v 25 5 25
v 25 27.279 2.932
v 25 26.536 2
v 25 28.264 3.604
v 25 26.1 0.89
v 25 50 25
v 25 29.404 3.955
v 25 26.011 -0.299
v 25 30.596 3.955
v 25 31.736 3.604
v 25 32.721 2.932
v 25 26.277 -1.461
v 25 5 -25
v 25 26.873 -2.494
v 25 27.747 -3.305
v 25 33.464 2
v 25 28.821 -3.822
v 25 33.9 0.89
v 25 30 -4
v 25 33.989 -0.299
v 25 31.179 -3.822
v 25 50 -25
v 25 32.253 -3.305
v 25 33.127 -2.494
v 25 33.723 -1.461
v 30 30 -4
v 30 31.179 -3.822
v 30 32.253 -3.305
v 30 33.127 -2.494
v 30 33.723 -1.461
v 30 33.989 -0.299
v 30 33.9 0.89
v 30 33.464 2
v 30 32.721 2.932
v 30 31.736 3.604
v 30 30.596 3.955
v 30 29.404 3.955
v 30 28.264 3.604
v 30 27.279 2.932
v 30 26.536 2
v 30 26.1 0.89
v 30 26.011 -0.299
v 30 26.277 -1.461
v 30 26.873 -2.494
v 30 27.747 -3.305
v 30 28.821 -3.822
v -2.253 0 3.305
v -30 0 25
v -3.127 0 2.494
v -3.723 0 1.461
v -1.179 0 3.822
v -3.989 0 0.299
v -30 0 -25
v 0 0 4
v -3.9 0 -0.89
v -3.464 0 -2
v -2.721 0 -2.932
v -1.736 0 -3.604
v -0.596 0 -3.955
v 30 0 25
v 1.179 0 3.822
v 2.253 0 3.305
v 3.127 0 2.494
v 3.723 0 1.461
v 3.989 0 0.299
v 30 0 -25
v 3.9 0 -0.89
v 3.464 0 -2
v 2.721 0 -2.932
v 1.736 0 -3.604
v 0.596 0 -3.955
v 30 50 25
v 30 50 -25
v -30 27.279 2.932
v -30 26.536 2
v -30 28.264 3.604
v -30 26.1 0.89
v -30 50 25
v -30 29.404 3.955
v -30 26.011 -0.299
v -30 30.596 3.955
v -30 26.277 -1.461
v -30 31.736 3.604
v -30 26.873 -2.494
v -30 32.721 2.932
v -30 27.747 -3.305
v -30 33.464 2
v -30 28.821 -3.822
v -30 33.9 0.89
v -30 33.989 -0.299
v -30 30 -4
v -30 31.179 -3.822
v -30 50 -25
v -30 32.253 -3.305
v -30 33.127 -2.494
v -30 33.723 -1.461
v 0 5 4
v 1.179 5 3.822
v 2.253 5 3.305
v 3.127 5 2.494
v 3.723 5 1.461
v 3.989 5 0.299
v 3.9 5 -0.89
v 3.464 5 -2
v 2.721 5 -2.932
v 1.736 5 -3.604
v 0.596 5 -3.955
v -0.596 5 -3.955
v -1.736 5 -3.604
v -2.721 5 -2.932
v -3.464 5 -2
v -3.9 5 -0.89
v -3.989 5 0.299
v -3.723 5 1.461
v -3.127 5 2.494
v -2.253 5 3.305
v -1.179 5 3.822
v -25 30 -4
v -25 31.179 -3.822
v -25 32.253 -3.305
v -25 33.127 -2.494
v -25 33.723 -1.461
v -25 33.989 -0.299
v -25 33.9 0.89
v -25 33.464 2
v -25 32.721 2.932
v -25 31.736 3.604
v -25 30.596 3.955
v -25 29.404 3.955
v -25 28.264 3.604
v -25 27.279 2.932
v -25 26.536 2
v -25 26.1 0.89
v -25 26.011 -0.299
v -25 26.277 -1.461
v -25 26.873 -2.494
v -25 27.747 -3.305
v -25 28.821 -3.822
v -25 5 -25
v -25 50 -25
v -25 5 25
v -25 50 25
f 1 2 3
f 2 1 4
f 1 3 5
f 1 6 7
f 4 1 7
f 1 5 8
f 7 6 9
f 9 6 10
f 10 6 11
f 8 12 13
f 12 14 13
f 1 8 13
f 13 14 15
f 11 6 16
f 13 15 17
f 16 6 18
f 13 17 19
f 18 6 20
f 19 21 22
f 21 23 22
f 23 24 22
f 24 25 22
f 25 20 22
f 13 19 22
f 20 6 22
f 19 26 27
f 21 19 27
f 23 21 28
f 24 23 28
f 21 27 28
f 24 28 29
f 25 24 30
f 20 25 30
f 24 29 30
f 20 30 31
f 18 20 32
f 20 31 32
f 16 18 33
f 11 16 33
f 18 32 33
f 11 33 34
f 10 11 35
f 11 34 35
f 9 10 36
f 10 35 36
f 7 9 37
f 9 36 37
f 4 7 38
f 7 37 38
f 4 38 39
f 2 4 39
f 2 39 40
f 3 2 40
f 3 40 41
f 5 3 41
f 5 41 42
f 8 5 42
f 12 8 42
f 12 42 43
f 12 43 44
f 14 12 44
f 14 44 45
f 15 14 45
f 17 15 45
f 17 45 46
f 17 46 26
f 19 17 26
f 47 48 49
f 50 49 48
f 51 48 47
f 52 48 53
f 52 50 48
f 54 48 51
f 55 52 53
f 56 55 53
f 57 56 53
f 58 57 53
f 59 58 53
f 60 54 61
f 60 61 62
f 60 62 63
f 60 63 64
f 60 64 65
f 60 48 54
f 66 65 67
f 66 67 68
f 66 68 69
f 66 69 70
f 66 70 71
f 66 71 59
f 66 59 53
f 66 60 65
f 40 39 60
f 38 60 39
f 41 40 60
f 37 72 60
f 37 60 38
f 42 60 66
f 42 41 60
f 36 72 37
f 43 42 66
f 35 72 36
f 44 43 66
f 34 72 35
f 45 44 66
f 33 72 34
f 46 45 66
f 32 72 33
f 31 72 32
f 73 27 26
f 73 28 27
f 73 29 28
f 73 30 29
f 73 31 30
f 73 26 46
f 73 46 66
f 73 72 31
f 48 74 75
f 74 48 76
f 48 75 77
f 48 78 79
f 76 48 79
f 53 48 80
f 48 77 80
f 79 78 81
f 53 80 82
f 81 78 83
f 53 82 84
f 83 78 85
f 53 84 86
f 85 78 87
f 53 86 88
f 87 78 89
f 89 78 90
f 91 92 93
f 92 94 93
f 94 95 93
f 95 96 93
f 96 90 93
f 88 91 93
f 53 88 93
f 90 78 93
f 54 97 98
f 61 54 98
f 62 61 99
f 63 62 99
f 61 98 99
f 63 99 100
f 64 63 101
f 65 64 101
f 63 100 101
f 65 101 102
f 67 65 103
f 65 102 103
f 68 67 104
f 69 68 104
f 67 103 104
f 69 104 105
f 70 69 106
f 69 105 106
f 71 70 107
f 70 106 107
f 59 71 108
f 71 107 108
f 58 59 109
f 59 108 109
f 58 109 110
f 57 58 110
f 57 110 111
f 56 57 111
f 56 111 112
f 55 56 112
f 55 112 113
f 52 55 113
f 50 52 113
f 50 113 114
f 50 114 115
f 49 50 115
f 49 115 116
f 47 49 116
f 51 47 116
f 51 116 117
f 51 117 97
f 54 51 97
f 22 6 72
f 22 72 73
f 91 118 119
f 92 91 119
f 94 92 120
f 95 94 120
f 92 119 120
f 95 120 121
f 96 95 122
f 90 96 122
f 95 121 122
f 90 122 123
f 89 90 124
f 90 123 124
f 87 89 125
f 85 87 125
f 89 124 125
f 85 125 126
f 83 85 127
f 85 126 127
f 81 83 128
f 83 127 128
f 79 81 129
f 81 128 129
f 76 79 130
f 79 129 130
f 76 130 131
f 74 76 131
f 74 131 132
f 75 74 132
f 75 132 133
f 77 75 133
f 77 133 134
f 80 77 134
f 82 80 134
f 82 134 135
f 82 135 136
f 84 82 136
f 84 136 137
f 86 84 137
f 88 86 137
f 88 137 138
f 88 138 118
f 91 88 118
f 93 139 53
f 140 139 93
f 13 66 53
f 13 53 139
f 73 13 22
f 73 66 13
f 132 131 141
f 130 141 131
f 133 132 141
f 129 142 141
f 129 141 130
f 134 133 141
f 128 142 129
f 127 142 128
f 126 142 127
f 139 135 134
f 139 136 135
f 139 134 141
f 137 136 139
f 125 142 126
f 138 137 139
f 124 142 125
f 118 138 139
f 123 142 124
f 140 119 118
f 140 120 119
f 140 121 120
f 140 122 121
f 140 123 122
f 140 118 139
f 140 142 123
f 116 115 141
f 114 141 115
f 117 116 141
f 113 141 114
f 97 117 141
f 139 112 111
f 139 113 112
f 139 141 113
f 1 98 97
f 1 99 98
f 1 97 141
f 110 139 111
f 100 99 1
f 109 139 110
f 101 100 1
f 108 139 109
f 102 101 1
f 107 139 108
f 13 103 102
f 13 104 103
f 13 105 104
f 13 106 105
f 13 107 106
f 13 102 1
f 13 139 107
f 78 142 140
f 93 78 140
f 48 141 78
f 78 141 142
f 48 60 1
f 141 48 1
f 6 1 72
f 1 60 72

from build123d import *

# Parameters (mm, degrees)
SKETCH_1_W          = 50
SKETCH_1_H          = 50
EXTRUDE_1_DEPTH     = 5
SKETCH_2_W          = 50
SKETCH_2_H          = 50
EXTRUDE_2_DEPTH     = 5
SKETCH_3_R          = 4
CUT_EXTRUDE_1_DEPTH = 10
SKETCH_4_R          = 4
CUT_EXTRUDE_2_DEPTH = 83.006097334


with BuildPart() as part:
    # 草图1 → 凸台-拉伸1 (new body)
    with BuildSketch(Plane(origin=(0, 0, 0), x_dir=(1, 0, 0), z_dir=(0, 1, 0))):
        Rectangle(SKETCH_1_W, SKETCH_1_H)
    extrude(amount=EXTRUDE_1_DEPTH)

    # 草图2 → 凸台-拉伸2 (add)
    with BuildSketch(Plane(origin=(25, 0, 0), x_dir=(0, 0, -1), z_dir=(1, 0, 0))):
        with Locations((0, 25)):
            Rectangle(SKETCH_2_W, SKETCH_2_H)
    extrude_2 = extrude(amount=EXTRUDE_2_DEPTH)

    # 镜向1: 凸台-拉伸2 across plane
    add(extrude_2.mirror(Plane(origin=(0, 0, 0), x_dir=(0, 0, 1), z_dir=(1, 0, 0))))

    # 草图3 → 切除-拉伸1 (cut)
    with BuildSketch(Plane(origin=(0, 5, 0), x_dir=(1, 0, 0), z_dir=(0, 1, 0))):
        with Locations(Location((0, 0, 0), (0, 0, 270))):
            Circle(SKETCH_3_R)
    extrude(amount=-CUT_EXTRUDE_1_DEPTH, mode=Mode.SUBTRACT)

    # 草图4 → 切除-拉伸2 (cut, through all)
    with BuildSketch(Plane(origin=(30, 0, 0), x_dir=(0, 0, -1), z_dir=(1, 0, 0))):
        with Locations((0, 30)):
            Circle(SKETCH_4_R)
    extrude(amount=-CUT_EXTRUDE_2_DEPTH, mode=Mode.SUBTRACT)


solid = part.part
